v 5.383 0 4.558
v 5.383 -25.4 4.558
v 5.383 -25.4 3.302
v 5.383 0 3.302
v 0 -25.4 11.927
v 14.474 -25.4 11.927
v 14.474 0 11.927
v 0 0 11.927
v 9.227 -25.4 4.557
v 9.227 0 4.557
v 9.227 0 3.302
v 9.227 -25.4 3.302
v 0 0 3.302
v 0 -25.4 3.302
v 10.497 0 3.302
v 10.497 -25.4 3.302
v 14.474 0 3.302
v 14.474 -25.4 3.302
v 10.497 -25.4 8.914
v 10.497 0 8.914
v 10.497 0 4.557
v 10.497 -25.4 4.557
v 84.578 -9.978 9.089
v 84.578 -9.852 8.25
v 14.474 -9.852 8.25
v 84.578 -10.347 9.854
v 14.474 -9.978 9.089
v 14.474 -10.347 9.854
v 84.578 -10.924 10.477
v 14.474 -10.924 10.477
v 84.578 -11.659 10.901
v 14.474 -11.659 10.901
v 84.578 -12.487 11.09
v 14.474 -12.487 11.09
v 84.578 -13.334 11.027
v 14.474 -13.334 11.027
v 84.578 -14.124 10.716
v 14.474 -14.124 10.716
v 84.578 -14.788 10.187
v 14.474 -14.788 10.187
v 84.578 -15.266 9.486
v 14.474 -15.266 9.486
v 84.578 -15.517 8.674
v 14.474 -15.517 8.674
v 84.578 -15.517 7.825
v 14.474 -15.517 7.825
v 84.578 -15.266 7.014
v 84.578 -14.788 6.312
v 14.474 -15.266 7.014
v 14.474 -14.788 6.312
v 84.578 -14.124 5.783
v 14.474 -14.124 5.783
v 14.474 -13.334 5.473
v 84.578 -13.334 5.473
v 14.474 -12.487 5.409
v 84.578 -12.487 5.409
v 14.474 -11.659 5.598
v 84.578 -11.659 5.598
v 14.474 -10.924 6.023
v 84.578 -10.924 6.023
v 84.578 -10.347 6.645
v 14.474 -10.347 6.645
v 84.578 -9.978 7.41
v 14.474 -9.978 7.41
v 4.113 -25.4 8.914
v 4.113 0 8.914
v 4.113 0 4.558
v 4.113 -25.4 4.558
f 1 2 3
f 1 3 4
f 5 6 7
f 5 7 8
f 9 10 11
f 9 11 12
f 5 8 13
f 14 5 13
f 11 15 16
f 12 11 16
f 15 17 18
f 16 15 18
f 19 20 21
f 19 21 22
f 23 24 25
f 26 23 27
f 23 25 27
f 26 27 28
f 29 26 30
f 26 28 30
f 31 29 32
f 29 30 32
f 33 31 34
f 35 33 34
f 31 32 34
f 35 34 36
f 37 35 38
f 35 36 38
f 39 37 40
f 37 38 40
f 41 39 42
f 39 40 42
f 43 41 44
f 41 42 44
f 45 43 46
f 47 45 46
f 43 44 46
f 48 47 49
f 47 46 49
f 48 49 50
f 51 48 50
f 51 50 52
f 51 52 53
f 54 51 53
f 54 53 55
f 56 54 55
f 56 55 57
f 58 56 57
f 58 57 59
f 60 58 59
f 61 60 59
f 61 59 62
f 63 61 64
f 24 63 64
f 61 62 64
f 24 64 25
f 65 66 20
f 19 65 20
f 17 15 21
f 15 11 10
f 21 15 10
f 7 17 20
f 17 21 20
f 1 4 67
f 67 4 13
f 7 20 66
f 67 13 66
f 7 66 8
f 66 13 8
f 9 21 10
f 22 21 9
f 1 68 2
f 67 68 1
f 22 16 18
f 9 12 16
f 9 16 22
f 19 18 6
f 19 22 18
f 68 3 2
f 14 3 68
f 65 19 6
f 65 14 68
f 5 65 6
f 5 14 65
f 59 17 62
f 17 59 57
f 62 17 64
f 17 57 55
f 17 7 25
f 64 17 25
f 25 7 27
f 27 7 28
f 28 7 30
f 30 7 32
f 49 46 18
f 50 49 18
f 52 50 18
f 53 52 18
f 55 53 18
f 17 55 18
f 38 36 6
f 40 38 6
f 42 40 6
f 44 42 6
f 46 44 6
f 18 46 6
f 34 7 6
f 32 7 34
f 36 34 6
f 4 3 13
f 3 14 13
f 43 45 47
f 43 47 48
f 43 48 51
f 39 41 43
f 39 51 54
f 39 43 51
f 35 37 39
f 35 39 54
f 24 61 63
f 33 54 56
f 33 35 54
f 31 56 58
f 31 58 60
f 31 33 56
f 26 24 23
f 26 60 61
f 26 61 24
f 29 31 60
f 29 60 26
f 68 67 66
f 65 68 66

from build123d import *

# Parameters (mm, degrees)
F1_DEPTH = 25.4
F2_DEPTH = 4.572
F3_R     = 2.8483502815
F4_DEPTH = 70.104
F5_DEPTH = 1.27
F6_W     = 25.4
F6_H     = 1.2553478565
F8_DEPTH = 1.27
F7_W     = 25.4
F7_H     = 1.2564980398
F9_DEPTH = 1.27


with BuildPart() as f1:
    # F0 (on Front) → F1 (new body)
    with BuildSketch(Plane.XZ):
        Polygon((0, 11.9274239987), (0, 0), (4.1132315528, 0), (4.1132315528, 8.9138071053), (10.4970876127, 8.9138071053), (10.4970876127, 0), (14.4736012444, 0), (14.4736012444, 11.9274239987), align=None)
    extrude(amount=F1_DEPTH)

    # F2 (cut): faces of the model
    f2_faces = [f1.faces().sort_by_distance(p)[0] for p in [
        (2.0566157764, -12.7, 0),
        (12.4853444286, -12.7, 0),
    ]]
    extrude(f2_faces, amount=-F2_DEPTH, mode=Mode.SUBTRACT)

    # F3 (on face) → F4 (join)
    with BuildSketch(Plane.YZ.offset(14.4736012444)):
        with Locations((-12.7, 8.2497119994)):
            Circle(F3_R)
    extrude(amount=F4_DEPTH)

    # F5 (add): faces of the model
    f5_faces = [f1.faces().sort_by_distance(p)[0] for p in [
        (12.4853444286, -12.7, 4.572),
        (2.0566157764, -12.7, 4.572),
    ]]
    extrude(f5_faces, amount=F5_DEPTH)

    # F6 (on face) → F8 (join)
    with BuildSketch(Plane(origin=(10.4970876127, 0, 0), x_dir=(0, -1, 0), z_dir=(-1, 0, 0))):
        with Locations((12.7, 3.9296739282)):
            Rectangle(F6_W, F6_H)
    extrude(amount=F8_DEPTH)

    # F7 (on face) → F9 (join)
    with BuildSketch(Plane.YZ.offset(4.1132315528)):
        with Locations((-12.7, 3.9302490199)):
            Rectangle(F7_W, F7_H)
    extrude(amount=F9_DEPTH)


solid = f1.part
